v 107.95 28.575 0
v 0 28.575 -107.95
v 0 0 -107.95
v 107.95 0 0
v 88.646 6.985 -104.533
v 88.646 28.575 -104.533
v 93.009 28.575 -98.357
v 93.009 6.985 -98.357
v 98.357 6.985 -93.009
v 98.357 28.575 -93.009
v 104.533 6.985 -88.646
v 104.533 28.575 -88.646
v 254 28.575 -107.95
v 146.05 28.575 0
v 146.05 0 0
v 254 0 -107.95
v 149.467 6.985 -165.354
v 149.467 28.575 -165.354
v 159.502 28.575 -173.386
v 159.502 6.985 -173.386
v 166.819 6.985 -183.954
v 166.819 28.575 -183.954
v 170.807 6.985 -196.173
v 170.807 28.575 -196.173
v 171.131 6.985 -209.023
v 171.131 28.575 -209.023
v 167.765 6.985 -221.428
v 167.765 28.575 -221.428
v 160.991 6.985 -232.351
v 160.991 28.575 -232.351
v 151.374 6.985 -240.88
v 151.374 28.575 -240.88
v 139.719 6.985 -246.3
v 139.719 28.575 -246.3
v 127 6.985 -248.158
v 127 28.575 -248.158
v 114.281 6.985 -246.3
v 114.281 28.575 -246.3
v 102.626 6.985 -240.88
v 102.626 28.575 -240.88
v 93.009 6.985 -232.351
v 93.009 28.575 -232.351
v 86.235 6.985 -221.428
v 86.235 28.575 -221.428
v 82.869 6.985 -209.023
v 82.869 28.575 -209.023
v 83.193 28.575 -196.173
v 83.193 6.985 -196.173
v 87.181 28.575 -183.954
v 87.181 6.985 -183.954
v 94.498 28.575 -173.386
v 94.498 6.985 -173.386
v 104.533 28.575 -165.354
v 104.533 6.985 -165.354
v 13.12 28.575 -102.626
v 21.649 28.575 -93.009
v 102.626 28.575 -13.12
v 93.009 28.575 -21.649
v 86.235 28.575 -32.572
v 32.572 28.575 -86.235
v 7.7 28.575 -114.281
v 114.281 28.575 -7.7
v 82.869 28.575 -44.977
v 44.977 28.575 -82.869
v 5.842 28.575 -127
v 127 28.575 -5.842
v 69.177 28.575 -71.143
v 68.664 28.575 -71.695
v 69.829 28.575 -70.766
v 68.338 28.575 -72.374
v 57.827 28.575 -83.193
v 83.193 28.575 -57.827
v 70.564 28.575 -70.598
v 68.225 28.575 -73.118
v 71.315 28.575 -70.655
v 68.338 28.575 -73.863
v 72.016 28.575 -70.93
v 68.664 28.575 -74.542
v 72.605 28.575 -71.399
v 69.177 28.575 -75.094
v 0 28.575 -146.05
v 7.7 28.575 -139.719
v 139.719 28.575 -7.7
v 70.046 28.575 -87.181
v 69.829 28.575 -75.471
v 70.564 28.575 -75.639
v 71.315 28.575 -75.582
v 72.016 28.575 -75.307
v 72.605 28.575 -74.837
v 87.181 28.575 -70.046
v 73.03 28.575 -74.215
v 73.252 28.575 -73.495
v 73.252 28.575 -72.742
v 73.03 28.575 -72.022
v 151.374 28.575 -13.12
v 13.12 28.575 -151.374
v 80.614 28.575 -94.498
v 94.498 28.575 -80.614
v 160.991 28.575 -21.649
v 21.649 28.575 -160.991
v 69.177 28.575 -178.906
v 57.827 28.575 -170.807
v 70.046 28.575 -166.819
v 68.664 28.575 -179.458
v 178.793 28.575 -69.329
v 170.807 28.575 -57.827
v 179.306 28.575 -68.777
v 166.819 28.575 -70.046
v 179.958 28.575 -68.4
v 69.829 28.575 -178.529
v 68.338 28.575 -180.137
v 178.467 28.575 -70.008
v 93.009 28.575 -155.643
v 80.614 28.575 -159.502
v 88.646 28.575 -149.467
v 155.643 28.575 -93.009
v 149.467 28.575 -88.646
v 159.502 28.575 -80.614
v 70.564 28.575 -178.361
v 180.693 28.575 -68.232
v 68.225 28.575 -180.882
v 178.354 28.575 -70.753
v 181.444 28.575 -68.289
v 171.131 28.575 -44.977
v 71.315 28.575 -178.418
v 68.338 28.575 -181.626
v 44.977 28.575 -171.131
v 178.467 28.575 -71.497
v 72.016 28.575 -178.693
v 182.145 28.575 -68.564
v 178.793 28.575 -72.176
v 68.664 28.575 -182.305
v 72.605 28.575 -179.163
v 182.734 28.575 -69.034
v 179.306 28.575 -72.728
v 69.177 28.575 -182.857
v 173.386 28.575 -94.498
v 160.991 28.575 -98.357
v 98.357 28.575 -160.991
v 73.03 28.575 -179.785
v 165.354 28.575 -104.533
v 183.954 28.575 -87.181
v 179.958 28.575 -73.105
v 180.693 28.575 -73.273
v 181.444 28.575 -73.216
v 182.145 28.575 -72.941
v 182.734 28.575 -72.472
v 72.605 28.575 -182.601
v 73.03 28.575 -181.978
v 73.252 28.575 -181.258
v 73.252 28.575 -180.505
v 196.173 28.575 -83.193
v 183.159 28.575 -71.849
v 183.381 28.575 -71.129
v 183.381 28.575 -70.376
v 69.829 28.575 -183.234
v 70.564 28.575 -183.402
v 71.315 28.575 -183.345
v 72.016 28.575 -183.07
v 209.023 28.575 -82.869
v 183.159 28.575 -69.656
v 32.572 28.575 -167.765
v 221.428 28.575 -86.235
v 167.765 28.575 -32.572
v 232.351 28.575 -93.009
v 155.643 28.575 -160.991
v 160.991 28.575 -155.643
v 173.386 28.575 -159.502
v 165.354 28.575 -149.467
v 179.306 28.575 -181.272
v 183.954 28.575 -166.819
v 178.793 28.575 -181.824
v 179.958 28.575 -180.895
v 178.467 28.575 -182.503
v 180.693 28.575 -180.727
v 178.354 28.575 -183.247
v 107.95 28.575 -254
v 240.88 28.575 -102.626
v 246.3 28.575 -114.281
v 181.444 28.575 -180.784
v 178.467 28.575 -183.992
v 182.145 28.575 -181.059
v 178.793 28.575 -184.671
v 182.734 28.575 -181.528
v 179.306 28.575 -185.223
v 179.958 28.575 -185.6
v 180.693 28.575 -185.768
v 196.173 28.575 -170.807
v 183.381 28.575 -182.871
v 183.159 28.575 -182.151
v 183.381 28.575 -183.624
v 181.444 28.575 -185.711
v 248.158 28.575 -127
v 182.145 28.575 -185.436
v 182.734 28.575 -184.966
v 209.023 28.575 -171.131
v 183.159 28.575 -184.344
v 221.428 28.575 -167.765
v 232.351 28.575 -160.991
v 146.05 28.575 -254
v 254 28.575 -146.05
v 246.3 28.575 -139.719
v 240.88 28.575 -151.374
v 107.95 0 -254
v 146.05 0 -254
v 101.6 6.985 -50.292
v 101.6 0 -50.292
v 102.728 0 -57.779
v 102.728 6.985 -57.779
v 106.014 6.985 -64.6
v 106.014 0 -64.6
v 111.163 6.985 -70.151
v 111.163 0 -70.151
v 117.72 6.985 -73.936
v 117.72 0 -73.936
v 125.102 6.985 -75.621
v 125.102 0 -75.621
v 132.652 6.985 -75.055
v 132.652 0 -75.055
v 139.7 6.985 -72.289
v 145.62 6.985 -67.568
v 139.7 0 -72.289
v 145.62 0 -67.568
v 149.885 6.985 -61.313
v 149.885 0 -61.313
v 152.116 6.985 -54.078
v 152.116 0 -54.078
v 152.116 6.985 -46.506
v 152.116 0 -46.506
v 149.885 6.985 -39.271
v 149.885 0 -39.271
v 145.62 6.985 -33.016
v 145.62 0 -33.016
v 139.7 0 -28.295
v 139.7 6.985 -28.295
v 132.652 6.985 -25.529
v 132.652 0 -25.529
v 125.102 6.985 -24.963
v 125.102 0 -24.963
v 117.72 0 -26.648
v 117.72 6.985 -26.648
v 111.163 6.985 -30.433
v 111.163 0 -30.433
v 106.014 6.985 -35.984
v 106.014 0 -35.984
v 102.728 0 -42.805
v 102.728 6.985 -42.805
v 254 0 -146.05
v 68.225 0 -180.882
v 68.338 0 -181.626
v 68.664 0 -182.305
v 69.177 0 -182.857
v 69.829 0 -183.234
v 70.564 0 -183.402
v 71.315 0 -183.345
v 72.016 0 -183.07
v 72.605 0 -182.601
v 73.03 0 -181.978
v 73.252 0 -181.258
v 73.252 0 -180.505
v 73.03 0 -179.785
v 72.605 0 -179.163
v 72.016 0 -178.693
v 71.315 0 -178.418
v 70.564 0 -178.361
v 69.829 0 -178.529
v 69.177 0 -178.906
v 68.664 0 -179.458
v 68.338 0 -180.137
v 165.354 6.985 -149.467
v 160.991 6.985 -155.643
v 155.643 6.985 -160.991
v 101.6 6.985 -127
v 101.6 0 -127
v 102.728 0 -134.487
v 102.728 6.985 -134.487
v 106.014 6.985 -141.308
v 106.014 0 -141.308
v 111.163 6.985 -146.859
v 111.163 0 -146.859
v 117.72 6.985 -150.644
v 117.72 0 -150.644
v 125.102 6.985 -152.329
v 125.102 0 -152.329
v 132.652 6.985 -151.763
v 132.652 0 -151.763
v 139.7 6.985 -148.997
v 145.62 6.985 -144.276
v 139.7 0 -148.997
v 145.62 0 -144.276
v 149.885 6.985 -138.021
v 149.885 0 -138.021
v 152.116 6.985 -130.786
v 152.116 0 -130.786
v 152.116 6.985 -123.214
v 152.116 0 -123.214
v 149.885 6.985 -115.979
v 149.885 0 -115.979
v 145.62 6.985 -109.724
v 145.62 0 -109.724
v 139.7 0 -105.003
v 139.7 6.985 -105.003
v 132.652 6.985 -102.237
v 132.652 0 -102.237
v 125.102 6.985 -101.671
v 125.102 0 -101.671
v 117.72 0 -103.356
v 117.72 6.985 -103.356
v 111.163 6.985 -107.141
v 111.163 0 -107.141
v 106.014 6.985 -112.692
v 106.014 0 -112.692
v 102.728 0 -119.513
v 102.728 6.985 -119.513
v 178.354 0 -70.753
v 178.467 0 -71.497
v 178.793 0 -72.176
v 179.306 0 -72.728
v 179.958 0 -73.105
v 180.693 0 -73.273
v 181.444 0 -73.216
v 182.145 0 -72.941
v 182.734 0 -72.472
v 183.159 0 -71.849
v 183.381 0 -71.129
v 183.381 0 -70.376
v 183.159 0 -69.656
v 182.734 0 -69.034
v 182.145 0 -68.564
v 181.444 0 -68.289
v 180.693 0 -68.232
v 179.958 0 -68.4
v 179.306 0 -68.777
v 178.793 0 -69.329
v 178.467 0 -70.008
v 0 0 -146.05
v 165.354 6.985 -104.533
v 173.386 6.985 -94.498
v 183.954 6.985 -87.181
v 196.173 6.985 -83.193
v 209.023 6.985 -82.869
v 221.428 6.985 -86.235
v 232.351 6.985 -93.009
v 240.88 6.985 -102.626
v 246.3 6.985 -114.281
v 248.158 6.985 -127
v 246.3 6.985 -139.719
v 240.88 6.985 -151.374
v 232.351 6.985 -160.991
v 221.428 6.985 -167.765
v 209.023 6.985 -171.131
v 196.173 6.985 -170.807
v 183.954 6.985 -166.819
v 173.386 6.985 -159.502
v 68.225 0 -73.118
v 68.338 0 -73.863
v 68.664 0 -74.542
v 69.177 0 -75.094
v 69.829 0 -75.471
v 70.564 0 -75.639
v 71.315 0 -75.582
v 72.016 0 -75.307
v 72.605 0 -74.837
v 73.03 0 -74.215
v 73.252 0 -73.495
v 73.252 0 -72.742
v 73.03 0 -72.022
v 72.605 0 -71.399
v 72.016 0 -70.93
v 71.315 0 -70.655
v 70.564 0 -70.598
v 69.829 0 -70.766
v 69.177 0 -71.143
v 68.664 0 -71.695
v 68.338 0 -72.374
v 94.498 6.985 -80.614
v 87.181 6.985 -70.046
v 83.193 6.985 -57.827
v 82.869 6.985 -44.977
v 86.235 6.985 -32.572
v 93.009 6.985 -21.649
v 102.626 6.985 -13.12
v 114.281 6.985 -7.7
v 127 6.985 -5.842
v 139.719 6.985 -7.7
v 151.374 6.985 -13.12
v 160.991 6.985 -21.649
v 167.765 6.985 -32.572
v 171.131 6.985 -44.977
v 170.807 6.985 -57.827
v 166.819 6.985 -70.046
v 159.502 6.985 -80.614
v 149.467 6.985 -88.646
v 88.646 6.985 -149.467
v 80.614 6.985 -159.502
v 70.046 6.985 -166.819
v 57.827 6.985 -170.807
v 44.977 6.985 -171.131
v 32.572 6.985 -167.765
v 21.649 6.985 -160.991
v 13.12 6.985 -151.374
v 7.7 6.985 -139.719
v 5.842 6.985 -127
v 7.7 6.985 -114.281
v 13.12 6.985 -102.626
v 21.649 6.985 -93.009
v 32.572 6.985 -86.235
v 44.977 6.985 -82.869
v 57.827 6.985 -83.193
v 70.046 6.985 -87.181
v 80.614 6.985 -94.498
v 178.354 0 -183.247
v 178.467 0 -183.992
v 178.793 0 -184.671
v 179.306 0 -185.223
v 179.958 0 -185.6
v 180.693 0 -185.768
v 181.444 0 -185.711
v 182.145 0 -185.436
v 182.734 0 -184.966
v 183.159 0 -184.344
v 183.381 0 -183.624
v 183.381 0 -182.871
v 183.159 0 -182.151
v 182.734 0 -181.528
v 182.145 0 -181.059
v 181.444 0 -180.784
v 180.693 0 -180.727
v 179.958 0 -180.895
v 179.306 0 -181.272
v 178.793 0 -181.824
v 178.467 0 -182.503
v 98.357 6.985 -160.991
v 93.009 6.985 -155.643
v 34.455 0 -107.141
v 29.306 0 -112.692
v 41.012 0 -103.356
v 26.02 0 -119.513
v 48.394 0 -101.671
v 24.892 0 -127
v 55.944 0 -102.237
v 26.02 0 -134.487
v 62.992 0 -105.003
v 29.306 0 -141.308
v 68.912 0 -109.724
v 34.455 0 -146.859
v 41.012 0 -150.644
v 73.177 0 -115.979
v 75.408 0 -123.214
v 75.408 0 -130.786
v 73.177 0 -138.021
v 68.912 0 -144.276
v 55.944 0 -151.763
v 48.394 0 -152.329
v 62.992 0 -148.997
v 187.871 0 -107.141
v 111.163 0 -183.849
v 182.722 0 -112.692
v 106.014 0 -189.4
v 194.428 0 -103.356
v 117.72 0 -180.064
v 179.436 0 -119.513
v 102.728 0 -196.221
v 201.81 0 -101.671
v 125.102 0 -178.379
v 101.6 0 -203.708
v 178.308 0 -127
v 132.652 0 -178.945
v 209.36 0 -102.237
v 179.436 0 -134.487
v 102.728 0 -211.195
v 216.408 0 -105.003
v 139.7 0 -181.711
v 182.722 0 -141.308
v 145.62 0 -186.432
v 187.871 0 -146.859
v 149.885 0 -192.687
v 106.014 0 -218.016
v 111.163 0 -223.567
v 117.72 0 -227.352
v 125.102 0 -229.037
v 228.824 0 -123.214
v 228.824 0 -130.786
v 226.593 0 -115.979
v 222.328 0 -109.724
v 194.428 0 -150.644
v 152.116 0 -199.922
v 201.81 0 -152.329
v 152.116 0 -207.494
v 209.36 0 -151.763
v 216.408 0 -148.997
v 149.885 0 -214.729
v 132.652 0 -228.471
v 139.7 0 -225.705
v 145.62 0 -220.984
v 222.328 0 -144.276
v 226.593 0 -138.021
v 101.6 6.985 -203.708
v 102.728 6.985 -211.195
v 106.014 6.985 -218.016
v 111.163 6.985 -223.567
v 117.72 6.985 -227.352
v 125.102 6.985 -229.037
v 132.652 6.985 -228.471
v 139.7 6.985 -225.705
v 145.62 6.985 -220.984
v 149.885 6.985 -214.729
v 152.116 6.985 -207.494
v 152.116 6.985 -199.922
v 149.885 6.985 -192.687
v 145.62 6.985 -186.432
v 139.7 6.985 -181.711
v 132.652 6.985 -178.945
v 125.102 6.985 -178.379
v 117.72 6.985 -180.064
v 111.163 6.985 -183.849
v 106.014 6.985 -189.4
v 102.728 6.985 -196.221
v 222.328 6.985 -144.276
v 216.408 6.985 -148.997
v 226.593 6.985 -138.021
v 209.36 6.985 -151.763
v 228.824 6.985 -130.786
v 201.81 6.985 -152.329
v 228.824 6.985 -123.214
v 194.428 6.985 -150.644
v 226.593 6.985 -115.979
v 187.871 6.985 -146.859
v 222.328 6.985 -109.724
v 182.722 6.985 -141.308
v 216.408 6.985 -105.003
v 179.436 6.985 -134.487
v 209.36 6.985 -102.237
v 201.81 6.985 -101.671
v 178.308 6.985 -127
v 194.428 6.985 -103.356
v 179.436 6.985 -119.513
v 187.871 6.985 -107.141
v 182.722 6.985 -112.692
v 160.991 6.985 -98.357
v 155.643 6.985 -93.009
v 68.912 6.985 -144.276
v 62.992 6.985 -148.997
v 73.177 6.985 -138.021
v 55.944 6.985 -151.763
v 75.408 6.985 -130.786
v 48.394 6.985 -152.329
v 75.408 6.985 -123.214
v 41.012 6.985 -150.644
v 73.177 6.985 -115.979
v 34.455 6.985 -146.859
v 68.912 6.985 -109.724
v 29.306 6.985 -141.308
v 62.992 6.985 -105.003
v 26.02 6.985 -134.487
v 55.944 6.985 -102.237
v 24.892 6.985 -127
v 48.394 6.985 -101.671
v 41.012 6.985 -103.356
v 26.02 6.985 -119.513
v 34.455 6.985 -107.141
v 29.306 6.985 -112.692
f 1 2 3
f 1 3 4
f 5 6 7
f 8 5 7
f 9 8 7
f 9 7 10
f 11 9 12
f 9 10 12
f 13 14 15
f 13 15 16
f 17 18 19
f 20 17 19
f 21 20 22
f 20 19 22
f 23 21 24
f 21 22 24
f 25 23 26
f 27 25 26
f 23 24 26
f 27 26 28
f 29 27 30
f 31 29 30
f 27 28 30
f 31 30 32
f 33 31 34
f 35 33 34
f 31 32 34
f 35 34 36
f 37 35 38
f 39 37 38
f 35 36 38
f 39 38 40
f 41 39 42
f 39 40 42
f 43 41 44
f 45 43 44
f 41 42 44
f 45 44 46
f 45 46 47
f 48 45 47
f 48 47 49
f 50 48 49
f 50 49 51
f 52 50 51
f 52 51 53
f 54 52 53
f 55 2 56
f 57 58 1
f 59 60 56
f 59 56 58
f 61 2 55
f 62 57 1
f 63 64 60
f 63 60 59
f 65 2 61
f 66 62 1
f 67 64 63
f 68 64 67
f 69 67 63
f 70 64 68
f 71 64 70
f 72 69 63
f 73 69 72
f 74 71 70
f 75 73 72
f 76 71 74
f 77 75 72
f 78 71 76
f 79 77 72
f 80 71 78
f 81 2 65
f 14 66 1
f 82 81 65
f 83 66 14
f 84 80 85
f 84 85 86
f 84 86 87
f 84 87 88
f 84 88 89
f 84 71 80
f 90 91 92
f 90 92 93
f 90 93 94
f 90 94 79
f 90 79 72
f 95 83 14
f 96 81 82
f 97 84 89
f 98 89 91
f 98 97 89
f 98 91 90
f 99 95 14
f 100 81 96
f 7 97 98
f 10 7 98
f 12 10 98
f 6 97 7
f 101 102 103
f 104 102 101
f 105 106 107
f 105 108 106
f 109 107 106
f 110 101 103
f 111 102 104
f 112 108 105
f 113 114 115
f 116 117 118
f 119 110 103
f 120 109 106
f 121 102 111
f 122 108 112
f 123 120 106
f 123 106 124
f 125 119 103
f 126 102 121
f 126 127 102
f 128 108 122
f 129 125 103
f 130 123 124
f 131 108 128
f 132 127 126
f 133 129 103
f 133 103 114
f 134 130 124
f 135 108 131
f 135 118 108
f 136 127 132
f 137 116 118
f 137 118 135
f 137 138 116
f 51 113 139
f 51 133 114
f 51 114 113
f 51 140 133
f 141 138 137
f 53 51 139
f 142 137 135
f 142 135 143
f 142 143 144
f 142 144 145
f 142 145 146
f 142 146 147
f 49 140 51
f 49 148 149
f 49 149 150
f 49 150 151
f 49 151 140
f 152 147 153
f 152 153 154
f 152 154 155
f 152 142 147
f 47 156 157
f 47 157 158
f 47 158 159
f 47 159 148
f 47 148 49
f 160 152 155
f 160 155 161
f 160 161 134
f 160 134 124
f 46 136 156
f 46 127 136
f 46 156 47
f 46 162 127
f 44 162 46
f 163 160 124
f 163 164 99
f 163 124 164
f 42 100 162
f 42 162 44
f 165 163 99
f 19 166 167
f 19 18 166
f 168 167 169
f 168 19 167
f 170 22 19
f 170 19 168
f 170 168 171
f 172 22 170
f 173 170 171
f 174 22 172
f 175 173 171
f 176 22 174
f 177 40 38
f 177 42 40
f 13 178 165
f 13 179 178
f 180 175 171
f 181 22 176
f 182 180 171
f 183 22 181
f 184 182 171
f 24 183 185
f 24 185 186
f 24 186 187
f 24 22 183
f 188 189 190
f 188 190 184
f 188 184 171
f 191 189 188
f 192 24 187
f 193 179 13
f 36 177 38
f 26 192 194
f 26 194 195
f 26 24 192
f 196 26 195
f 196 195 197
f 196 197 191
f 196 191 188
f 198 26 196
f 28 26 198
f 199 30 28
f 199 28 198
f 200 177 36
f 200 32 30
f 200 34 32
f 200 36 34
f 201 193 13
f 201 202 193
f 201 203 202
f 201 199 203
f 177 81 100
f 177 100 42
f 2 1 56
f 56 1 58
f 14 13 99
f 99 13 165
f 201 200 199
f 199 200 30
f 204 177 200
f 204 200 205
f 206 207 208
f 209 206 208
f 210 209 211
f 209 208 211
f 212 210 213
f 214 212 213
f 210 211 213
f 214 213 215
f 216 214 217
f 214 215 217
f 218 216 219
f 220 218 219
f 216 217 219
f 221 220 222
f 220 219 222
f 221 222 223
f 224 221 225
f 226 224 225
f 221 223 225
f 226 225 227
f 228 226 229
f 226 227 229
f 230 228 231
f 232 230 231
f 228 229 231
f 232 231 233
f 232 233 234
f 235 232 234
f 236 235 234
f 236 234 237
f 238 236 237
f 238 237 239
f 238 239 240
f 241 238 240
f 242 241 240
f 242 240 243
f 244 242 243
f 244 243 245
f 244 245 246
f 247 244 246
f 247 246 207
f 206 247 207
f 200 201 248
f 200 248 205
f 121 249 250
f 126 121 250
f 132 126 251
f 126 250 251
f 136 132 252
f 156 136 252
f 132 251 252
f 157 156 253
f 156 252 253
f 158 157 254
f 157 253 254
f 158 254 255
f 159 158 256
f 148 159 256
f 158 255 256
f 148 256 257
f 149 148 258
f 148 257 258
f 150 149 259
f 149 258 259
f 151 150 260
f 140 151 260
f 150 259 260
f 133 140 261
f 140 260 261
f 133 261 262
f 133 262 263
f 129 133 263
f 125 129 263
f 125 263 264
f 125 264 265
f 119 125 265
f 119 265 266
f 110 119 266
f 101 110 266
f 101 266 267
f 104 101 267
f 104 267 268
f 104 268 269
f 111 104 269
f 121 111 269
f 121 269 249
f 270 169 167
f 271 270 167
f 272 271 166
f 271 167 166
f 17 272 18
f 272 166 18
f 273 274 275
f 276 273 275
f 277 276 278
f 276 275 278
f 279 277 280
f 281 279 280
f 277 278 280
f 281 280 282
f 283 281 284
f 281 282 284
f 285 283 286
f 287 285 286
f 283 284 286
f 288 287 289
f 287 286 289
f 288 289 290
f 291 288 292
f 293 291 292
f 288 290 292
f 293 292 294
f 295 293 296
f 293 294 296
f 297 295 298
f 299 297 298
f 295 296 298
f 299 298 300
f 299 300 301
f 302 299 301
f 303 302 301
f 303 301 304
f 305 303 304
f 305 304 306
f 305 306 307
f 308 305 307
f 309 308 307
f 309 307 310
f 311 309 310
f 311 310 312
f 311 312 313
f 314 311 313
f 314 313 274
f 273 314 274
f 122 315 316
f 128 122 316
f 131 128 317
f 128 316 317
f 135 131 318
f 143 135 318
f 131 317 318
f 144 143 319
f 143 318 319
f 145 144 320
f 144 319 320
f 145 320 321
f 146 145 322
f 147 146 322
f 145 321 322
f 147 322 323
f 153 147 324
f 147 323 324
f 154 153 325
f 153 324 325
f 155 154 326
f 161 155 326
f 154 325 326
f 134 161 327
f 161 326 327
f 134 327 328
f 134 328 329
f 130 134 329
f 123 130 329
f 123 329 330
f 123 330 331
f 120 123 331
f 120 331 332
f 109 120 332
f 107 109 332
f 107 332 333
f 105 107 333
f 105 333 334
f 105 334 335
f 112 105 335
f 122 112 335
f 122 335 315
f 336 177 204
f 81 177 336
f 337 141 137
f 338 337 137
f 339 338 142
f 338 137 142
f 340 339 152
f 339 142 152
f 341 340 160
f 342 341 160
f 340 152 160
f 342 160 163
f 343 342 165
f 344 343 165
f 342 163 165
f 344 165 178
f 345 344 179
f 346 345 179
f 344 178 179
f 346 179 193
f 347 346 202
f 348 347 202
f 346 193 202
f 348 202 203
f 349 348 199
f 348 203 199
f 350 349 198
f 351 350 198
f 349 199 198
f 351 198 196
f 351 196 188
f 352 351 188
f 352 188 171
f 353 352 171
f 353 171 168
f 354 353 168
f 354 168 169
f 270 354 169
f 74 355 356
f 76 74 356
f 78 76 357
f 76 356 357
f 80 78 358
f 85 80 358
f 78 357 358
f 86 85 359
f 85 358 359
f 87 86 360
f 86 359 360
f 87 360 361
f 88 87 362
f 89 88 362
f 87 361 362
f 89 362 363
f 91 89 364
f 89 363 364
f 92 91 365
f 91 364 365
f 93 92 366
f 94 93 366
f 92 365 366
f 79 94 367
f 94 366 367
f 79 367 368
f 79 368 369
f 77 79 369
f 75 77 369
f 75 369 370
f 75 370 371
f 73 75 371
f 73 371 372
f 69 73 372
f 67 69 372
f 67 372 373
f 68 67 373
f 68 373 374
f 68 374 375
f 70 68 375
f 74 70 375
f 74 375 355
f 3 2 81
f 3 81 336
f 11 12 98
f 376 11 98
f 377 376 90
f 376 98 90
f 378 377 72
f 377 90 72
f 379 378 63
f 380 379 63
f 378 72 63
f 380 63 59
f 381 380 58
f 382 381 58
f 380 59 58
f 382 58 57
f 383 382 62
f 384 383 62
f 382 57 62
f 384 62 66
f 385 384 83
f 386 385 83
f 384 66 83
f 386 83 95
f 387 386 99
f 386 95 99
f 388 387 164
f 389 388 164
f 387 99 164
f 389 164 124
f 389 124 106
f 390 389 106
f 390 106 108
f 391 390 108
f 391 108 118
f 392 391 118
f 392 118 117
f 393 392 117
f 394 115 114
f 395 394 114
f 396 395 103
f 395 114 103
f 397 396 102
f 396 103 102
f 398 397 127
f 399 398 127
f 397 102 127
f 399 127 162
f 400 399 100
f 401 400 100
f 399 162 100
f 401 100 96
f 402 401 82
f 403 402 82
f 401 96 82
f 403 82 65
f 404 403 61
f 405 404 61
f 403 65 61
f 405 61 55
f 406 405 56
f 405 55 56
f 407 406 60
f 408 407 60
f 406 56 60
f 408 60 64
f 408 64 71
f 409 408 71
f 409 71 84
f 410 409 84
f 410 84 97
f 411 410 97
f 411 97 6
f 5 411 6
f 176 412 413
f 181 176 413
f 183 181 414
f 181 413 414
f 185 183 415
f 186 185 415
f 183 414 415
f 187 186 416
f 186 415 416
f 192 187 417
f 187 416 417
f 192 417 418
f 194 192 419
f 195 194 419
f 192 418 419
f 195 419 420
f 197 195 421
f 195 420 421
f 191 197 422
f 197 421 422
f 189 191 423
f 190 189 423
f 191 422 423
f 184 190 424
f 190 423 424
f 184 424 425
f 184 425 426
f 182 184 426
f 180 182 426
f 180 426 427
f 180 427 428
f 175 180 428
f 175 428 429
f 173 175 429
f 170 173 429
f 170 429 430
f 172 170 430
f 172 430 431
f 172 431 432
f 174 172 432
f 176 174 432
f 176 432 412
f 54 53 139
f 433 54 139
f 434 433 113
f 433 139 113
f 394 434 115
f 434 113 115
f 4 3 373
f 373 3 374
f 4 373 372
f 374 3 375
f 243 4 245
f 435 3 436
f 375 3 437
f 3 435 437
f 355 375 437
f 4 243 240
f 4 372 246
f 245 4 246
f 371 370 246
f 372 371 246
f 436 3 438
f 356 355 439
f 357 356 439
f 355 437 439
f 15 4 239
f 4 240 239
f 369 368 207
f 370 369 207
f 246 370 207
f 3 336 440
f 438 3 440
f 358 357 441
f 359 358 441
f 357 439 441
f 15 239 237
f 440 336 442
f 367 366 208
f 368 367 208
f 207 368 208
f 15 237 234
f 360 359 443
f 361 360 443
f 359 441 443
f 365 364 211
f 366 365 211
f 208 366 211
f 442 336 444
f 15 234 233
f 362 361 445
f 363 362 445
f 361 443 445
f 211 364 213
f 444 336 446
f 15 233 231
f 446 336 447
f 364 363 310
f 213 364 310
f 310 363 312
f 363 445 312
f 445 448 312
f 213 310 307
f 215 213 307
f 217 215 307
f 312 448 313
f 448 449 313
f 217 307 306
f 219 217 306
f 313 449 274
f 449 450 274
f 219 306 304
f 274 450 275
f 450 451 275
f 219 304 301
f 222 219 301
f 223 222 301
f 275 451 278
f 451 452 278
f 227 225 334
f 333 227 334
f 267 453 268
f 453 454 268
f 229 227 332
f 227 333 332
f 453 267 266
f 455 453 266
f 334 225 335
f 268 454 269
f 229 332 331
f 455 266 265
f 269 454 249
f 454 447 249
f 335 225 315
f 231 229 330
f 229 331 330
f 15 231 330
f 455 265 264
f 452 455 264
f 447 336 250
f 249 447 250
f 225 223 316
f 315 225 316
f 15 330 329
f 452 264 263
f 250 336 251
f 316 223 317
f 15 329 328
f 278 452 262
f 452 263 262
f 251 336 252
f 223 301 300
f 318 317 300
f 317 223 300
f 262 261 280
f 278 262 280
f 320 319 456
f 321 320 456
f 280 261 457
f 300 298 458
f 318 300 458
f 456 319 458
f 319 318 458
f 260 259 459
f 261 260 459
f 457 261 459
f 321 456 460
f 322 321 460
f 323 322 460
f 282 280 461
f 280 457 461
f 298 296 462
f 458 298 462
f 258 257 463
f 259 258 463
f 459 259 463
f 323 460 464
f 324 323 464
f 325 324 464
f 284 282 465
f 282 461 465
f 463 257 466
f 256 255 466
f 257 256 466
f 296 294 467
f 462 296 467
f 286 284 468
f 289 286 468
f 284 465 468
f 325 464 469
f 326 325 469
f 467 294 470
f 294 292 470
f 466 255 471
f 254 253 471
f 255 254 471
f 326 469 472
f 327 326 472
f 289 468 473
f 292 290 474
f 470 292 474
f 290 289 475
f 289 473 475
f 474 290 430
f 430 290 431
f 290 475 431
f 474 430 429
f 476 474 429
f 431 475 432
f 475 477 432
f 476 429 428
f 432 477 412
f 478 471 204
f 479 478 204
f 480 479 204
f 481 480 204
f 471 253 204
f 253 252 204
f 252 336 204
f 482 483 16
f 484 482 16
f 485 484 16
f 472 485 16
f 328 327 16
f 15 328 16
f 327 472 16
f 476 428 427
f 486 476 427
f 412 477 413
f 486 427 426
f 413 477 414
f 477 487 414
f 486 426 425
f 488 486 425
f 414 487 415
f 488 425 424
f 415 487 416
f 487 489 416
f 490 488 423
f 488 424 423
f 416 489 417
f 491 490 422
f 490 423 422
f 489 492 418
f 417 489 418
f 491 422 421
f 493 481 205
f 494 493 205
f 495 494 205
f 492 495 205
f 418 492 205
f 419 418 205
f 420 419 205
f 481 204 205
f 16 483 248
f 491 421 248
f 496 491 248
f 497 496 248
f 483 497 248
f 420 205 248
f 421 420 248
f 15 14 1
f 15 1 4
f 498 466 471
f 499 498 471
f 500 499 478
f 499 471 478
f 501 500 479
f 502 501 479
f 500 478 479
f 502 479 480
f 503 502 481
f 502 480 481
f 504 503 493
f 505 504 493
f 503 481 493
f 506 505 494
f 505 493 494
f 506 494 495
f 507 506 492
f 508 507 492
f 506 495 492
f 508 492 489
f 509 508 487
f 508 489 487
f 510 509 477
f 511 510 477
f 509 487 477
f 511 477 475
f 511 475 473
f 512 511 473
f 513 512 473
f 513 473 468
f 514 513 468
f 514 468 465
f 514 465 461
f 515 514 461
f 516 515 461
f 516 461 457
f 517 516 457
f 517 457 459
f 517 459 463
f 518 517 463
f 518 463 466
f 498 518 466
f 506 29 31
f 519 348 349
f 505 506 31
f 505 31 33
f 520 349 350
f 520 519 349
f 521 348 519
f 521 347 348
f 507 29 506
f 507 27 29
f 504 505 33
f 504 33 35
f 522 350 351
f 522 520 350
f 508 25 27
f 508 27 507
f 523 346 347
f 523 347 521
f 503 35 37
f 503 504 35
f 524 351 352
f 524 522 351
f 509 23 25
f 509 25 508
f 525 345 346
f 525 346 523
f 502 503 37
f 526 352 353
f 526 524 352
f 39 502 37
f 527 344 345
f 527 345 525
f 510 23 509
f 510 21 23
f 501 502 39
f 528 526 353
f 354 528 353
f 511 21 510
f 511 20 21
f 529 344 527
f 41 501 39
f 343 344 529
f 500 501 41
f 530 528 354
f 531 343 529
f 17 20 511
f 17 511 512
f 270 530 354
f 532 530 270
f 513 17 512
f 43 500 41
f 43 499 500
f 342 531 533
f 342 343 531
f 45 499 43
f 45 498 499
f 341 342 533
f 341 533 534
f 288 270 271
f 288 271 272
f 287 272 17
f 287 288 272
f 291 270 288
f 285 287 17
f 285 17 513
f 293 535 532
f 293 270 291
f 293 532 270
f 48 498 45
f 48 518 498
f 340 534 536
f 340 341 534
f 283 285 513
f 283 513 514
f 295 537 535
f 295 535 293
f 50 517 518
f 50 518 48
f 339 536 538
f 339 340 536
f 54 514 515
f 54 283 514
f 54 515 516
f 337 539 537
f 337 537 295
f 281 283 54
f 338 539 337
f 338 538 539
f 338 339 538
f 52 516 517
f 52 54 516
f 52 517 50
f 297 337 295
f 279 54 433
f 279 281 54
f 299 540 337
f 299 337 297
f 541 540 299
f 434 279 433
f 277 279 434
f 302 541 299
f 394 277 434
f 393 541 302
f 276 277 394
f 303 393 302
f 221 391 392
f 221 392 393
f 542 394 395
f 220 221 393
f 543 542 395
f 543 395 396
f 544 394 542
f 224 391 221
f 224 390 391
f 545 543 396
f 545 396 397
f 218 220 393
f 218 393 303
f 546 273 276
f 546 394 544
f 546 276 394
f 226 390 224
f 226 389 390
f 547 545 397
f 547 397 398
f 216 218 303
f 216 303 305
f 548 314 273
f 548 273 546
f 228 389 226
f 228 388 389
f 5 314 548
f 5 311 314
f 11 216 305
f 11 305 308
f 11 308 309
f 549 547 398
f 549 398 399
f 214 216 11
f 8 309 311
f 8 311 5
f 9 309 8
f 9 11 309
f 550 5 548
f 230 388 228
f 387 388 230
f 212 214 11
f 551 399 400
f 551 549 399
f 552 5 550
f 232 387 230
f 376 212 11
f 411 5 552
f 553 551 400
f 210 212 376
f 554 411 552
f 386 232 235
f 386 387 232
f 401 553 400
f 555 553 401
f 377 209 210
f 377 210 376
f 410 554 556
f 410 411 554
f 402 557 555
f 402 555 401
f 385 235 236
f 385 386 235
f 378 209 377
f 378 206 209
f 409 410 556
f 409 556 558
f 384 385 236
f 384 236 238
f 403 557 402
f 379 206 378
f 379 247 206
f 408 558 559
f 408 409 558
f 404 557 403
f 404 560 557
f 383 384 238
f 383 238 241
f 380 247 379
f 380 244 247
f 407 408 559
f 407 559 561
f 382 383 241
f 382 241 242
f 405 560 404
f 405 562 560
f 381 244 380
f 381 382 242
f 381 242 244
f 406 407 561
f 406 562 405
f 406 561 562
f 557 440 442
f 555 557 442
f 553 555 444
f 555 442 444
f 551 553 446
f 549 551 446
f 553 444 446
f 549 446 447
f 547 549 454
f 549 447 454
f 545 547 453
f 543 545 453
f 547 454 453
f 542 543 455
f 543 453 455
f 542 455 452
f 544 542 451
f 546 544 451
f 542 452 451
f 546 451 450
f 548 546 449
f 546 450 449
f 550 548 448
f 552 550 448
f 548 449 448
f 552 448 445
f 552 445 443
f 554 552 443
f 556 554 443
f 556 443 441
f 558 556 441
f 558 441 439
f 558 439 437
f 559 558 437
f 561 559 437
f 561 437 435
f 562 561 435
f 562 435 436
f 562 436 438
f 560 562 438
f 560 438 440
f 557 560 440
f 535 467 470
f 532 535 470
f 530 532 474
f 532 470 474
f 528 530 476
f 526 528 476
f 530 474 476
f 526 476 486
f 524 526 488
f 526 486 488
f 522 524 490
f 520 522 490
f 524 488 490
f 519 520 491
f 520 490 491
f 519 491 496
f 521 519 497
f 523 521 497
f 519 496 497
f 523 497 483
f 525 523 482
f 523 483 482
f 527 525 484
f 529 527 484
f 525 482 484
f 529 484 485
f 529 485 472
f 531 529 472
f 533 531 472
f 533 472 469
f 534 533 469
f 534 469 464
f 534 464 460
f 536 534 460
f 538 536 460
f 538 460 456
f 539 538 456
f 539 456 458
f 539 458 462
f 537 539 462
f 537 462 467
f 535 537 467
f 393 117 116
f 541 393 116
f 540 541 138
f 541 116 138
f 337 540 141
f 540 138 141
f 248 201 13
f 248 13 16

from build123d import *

# Parameters (mm, degrees)
BOSS_EXTRUDE1_DEPTH        = 28.575
CUT_EXTRUDE1_DEPTH         = 21.59
F_8_0_199_DIAMETER_HOLE1_D = 5.0546
HOLE1_D                    = 50.8
CHAMFER1_SIZE              = 26.940768363


with BuildPart() as part:
    # Sketch1 → Boss-Extrude1 (new body)
    with BuildSketch(Plane(origin=(0, 28.575, 0), x_dir=(1, 0, 0), z_dir=(0, 1, 0))):
        Polygon((127, 273.05), (-19.05, 127), (127, -19.05), (273.05, 127), align=None)
    extrude(amount=-BOSS_EXTRUDE1_DEPTH)

    # Sketch2 → Cut-Extrude1 (cut)
    with BuildSketch(Plane(origin=(0, 28.575, 0), x_dir=(-1, 0, 0), z_dir=(0, 1, 0))):
        with BuildLine():
            ThreePointArc((-149.467157898, -88.646), (-158.430896424, -95.569103576), (-165.354, -104.532842102))
            ThreePointArc((-165.354, -104.532842102), (-248.158, -127), (-165.354, -149.467157898))
            ThreePointArc((-165.354, -149.467157898), (-158.430896424, -158.430896424), (-149.467157898, -165.354))
            ThreePointArc((-149.467157898, -165.354), (-127, -248.158), (-104.532842102, -165.354))
            ThreePointArc((-104.532842102, -165.354), (-95.569103576, -158.430896424), (-88.646, -149.467157898))
            ThreePointArc((-88.646, -149.467157898), (-5.842, -127), (-88.646, -104.532842102))
            ThreePointArc((-88.646, -104.532842102), (-95.569103576, -95.569103576), (-104.532842102, -88.646))
            ThreePointArc((-104.532842102, -88.646), (-127, -5.842), (-149.467157898, -88.646))
        make_face()
    extrude(amount=-CUT_EXTRUDE1_DEPTH, mode=Mode.SUBTRACT)

    # #8 (0.199) Diameter Hole1 (through all)
    with Locations(Plane(origin=(0, 28.575, 0), x_dir=(1, 0, 0), z_dir=(0, 1, 0))):
        with Locations((180.881536726, 183.247438789), (180.881536726, 70.752561211), (70.752561211, 73.118463274), (70.752561211, 180.881536726)):
            Hole(F_8_0_199_DIAMETER_HOLE1_D / 2)

    # Hole1 (through all)
    with Locations(Plane(origin=(0, 6.985, 0), x_dir=(1, 0, 0), z_dir=(0, 1, 0))):
        with Locations((127, 127), (127, 203.708), (50.292, 127), (127, 50.292), (203.708, 127)):
            Hole(HOLE1_D / 2)

    # Chamfer1
    chamfer1_edges = [part.edges().sort_by_distance(p)[0] for p in [
        (273.05, 14.2875, -127),
        (127, 14.2875, 19.05),
        (-19.05, 14.2875, -127),
        (127, 14.2875, -273.05),
    ]]
    chamfer(chamfer1_edges, length=CHAMFER1_SIZE)


solid = part.part
